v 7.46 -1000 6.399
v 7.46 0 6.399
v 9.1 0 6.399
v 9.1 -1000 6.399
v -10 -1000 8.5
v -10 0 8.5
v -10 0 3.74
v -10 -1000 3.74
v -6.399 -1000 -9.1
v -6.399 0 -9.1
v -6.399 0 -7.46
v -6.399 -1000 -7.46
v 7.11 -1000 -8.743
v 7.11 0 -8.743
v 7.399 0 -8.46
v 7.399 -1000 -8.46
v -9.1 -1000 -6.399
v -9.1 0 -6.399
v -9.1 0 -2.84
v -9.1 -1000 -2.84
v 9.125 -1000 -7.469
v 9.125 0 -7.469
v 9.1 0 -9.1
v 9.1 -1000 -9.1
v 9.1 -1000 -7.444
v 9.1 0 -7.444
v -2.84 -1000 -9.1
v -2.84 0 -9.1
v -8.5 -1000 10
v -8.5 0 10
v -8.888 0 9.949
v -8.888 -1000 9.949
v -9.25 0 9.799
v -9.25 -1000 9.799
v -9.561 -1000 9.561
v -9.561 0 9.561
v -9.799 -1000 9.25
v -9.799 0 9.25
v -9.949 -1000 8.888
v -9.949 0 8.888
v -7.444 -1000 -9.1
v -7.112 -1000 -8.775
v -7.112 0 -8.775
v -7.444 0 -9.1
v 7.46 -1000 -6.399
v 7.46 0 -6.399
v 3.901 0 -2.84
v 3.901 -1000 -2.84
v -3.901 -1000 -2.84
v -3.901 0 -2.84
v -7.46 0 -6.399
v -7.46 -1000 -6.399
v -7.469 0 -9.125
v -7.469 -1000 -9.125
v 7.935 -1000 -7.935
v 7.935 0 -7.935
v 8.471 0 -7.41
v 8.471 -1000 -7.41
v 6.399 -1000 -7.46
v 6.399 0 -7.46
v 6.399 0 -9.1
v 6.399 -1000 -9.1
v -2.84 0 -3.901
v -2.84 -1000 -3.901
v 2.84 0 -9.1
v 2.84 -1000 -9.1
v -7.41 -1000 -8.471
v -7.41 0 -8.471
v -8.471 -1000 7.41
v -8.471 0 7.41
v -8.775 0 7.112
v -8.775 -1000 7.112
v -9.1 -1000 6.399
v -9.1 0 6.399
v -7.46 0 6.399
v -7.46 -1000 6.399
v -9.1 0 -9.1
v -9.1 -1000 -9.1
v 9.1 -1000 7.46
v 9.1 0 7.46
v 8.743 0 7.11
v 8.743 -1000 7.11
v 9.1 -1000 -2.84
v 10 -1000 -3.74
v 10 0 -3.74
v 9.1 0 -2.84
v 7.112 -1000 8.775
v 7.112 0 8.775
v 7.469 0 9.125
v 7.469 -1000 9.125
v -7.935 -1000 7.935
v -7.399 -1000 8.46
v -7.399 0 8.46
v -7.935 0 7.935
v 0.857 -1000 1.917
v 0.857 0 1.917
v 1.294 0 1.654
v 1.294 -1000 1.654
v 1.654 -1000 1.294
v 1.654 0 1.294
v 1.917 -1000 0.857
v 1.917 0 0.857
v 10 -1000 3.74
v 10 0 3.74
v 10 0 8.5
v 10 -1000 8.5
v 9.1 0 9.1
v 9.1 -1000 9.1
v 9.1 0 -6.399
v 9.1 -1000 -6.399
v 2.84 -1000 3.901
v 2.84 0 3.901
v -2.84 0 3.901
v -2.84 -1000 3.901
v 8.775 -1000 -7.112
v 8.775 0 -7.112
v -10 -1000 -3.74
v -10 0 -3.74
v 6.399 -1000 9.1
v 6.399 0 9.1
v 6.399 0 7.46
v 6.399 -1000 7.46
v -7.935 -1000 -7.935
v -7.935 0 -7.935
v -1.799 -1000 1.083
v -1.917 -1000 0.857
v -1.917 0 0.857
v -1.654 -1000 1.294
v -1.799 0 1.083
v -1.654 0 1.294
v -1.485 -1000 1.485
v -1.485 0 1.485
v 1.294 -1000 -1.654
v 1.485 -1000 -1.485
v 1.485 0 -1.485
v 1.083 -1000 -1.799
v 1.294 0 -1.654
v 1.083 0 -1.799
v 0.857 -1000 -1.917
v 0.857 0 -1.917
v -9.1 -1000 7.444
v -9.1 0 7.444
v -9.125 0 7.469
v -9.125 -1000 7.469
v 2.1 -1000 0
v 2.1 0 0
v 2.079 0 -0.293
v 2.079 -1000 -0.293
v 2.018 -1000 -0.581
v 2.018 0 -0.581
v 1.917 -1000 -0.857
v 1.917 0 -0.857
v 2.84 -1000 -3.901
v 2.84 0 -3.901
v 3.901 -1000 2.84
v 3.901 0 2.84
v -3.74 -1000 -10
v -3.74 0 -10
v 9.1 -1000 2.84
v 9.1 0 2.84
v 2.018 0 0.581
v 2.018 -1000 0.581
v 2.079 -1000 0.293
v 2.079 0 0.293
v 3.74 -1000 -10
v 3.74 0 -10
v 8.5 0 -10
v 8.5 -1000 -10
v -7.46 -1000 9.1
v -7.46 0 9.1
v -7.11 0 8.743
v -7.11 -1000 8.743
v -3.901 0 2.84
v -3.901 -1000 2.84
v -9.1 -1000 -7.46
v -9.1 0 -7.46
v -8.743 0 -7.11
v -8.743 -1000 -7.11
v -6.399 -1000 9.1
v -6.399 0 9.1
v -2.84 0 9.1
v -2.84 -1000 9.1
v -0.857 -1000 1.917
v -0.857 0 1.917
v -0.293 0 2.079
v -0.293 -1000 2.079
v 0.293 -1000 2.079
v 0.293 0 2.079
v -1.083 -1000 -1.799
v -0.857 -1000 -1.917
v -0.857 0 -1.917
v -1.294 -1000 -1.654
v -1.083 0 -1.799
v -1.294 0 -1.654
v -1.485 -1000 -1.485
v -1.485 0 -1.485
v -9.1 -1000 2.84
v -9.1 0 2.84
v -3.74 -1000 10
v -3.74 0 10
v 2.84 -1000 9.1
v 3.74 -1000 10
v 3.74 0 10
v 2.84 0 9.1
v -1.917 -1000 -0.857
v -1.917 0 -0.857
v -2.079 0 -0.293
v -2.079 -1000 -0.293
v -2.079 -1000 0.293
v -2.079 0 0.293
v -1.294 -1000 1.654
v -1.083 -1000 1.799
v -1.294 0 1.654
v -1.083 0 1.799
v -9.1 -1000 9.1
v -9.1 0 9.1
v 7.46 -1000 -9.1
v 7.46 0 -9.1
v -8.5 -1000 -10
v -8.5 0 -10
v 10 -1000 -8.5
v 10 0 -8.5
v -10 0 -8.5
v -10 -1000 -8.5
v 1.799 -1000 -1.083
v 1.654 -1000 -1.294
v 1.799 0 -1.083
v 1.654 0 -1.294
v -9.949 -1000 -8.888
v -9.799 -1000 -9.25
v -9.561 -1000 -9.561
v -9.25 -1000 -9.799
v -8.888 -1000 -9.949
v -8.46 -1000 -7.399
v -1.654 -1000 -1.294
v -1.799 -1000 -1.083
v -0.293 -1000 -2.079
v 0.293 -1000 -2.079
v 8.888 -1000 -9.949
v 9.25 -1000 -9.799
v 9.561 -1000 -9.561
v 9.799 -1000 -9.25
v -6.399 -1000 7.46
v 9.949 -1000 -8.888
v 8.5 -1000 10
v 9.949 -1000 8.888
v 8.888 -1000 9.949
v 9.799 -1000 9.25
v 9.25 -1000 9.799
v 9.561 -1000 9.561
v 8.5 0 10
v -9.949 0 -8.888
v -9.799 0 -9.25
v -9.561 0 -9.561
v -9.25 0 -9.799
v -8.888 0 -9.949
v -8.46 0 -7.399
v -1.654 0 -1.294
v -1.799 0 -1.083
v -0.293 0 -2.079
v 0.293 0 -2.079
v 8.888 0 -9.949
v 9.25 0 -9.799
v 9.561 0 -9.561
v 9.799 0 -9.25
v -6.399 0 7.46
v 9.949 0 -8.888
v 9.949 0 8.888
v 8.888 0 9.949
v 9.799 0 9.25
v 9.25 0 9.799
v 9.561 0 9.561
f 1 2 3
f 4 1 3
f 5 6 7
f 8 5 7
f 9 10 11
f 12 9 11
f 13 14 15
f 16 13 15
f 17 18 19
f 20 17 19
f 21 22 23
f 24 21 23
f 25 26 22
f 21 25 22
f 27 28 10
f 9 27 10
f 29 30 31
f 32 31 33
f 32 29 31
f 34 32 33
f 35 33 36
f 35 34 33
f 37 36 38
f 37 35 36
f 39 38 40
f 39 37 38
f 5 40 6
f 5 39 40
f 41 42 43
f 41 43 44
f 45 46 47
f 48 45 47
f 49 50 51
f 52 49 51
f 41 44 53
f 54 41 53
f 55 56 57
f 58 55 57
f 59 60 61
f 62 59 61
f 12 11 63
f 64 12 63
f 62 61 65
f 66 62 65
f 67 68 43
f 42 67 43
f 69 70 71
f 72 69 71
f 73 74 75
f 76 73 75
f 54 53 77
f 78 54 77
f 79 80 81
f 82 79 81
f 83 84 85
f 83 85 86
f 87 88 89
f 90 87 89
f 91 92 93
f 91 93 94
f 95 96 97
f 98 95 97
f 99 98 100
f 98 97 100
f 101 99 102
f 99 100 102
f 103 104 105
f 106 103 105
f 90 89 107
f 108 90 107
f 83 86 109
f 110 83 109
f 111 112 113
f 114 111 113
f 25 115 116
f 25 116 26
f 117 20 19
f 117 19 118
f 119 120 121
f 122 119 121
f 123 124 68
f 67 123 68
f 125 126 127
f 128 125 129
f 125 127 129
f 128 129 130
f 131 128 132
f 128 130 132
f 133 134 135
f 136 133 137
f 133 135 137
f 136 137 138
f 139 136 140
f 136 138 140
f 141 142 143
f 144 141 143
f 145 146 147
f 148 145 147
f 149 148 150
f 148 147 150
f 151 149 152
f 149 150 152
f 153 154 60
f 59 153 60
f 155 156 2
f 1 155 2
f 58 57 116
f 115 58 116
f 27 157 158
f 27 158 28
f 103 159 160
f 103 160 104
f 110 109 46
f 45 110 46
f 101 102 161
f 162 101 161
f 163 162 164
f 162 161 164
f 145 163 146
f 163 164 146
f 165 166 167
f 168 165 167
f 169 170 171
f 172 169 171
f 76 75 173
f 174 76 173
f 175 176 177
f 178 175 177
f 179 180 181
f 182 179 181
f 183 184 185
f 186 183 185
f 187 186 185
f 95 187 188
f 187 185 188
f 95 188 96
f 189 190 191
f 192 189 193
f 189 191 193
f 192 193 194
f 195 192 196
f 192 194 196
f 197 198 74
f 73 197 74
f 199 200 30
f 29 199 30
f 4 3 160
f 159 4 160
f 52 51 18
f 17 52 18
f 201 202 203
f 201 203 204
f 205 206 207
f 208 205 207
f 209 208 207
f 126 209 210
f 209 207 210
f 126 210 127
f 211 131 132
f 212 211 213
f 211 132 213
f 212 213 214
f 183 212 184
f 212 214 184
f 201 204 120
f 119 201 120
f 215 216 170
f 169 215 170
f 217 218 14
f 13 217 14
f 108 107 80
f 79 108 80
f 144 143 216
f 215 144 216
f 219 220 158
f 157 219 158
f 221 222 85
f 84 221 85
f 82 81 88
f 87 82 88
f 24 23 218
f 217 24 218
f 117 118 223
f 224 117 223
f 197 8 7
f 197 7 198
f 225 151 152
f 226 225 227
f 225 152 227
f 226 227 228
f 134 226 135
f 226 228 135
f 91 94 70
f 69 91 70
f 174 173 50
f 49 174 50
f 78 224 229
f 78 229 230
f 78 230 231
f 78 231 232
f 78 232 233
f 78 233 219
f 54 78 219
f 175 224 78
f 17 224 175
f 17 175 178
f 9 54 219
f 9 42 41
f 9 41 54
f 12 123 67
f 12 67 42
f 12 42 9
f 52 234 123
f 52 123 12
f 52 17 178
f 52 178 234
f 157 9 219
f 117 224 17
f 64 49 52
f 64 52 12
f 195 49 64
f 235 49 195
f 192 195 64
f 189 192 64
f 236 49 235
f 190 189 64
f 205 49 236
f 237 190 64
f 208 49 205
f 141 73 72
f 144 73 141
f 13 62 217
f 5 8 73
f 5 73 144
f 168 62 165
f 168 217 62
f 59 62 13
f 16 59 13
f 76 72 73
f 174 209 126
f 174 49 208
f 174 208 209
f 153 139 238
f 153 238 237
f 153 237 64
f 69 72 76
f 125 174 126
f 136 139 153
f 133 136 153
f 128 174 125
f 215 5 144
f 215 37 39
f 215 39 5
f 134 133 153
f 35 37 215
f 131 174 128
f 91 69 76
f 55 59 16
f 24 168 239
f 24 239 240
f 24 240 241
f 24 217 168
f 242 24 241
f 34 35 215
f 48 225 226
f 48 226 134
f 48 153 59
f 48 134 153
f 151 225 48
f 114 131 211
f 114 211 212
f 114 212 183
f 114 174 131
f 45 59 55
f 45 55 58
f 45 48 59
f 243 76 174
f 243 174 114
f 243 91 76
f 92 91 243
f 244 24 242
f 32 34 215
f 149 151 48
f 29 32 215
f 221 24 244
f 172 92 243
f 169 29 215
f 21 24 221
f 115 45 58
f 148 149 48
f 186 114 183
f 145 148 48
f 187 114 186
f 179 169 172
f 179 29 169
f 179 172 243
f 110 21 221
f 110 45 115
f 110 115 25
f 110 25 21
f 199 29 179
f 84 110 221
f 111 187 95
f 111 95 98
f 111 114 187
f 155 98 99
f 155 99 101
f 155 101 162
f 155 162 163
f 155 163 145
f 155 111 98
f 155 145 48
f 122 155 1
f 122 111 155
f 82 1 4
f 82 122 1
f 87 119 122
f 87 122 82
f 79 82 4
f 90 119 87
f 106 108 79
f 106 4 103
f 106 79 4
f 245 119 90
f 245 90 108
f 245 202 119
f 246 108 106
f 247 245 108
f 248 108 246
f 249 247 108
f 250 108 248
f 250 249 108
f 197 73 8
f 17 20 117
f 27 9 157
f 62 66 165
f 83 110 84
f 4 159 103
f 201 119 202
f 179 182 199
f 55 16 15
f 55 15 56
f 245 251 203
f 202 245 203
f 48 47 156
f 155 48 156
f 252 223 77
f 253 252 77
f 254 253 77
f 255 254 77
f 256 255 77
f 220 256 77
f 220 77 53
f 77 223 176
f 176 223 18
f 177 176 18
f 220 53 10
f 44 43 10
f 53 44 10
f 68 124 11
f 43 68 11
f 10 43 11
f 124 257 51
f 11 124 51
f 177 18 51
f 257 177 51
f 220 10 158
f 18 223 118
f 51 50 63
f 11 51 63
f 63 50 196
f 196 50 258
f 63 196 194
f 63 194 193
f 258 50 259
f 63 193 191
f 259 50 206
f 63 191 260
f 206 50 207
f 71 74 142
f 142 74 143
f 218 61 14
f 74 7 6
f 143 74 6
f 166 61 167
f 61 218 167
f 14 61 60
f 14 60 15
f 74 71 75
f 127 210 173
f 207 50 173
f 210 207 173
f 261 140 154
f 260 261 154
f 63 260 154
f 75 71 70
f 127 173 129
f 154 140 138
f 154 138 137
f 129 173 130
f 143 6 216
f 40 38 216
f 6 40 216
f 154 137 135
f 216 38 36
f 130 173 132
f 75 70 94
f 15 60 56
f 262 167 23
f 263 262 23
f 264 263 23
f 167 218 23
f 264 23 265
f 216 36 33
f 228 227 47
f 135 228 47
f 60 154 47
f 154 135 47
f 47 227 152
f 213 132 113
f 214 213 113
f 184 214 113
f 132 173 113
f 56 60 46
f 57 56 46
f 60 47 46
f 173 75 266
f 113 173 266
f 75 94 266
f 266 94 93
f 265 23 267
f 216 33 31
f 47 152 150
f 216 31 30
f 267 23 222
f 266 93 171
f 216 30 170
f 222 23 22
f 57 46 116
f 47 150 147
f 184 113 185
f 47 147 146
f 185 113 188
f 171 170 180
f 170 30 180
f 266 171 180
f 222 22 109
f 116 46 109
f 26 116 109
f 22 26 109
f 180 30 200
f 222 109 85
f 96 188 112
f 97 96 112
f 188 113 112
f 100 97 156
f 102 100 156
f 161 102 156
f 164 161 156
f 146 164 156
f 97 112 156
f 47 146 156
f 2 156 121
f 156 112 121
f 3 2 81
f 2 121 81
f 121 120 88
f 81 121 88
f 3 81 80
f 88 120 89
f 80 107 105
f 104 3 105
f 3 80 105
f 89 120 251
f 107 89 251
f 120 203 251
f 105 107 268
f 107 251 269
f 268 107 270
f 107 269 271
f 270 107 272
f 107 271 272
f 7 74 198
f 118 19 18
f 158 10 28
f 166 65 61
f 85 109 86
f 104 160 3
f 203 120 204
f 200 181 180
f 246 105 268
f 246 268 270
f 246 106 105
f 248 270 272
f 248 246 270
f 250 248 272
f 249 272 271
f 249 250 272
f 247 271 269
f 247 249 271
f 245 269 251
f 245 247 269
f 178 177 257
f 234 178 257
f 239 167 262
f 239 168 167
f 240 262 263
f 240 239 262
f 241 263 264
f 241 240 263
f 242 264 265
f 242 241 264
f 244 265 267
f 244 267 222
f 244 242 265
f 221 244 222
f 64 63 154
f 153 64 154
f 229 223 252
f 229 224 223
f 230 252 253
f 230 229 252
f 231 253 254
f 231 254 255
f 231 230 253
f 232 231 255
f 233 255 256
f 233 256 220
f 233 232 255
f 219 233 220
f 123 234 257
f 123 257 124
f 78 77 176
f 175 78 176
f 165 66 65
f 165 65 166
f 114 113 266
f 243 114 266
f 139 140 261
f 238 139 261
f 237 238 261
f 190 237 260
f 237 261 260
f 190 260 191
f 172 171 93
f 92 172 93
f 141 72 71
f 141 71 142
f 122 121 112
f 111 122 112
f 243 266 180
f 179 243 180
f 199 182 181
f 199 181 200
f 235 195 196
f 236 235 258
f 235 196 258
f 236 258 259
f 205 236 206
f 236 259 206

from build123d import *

# Parameters (mm, degrees)
F1_DEPTH = 1000
F2_R     = 1.5


with BuildPart() as f1:
    # F0 (on Front) → F1 (new body)
    with BuildSketch(Plane.XZ):
        Polygon((-7.46, 9.1), (-6.39934, 9.1), (-2.84, 9.1), (-3.74, 10), (-10, 10), (-10, 3.74), (-9.1, 2.84), (-9.1, 6.39934), (-9.1, 7.444134), (-9.124691, 7.46934), (-9.1, 9.1), align=None)
        Polygon((-7.399089, 8.459749), (-6.39934, 7.46), (-6.39934, 9.1), (-7.46, 9.1), (-7.110116, 8.742815), align=None)
        Polygon((-7.46, 6.39934), (-8.470702, 7.410042), (-8.774807, 7.112154), (-9.1, 7.444134), (-9.1, 6.39934), align=None)
        with BuildLine():
            ThreePointArc((-1.917323, 0.856663), (-1.729884, 1.190588), (-1.484924, 1.484924))
            Line((-1.484924, 1.484924), (-7.934896, 7.934896))
            Line((-7.934896, 7.934896), (-8.470702, 7.410042))
            Line((-8.470702, 7.410042), (-7.46, 6.39934))
            Line((-7.46, 6.39934), (-3.90066, 2.84))
            Line((-3.90066, 2.84), (-1.917323, 0.856663))
        make_face()
        with BuildLine():
            ThreePointArc((-1.484924, 1.484924), (-1.190588, 1.729884), (-0.856663, 1.917323))
            Line((-0.856663, 1.917323), (-2.84, 3.90066))
            Line((-2.84, 3.90066), (-6.39934, 7.46))
            Line((-6.39934, 7.46), (-7.399089, 8.459749))
            Line((-7.399089, 8.459749), (-7.934896, 7.934896))
            Line((-7.934896, 7.934896), (-1.484924, 1.484924))
        make_face()
        with BuildLine():
            ThreePointArc((0.856663, 1.917323), (1.484924, 1.484924), (1.917323, 0.856663))
            Line((1.917323, 0.856663), (3.90066, 2.84))
            Line((3.90066, 2.84), (7.46, 6.39934))
            Line((7.46, 6.39934), (9.1, 6.39934))
            Line((9.1, 6.39934), (9.1, 2.84))
            Line((9.1, 2.84), (10, 3.74))
            Line((10, 3.74), (10, 10))
            Line((10, 10), (3.74, 10))
            Line((3.74, 10), (2.84, 9.1))
            Line((2.84, 9.1), (6.39934, 9.1))
            Line((6.39934, 9.1), (6.39934, 7.46))
            Line((6.39934, 7.46), (2.84, 3.90066))
            Line((2.84, 3.90066), (0.856663, 1.917323))
        make_face()
        Polygon((7.112154, 8.774807), (7.46934, 9.124691), (9.1, 9.1), (9.1, 7.46), (8.742815, 7.110116), align=None, mode=Mode.SUBTRACT)
        with BuildLine():
            ThreePointArc((1.917323, 0.856663), (2.053823, 0.437962), (2.1, 0))
            ThreePointArc((2.1, 0), (2.053823, -0.437962), (1.917323, -0.856663))
            Line((1.917323, -0.856663), (3.90066, -2.84))
            Line((3.90066, -2.84), (3.90066, 2.84))
            Line((3.90066, 2.84), (1.917323, 0.856663))
        make_face()
        with BuildLine():
            ThreePointArc((-0.856663, 1.917323), (0, 2.1), (0.856663, 1.917323))
            Line((0.856663, 1.917323), (2.84, 3.90066))
            Line((2.84, 3.90066), (-2.84, 3.90066))
            Line((-2.84, 3.90066), (-0.856663, 1.917323))
        make_face()
        with BuildLine():
            ThreePointArc((-1.917323, -0.856663), (-2.1, 0), (-1.917323, 0.856663))
            Line((-1.917323, 0.856663), (-3.90066, 2.84))
            Line((-3.90066, 2.84), (-3.90066, -2.84))
            Line((-3.90066, -2.84), (-1.917323, -0.856663))
        make_face()
        with BuildLine():
            Line((2.84, -3.90066), (0.856663, -1.917323))
            ThreePointArc((0.856663, -1.917323), (0, -2.1), (-0.856663, -1.917323))
            Line((-0.856663, -1.917323), (-2.84, -3.90066))
            Line((-2.84, -3.90066), (2.84, -3.90066))
        make_face()
        with BuildLine():
            Line((-2.84, -3.90066), (-0.856663, -1.917323))
            ThreePointArc((-0.856663, -1.917323), (-1.190588, -1.729884), (-1.484924, -1.484924))
            Line((-1.484924, -1.484924), (-7.934896, -7.934896))
            Line((-7.934896, -7.934896), (-7.410042, -8.470702))
            Line((-7.410042, -8.470702), (-6.39934, -7.46))
            Line((-6.39934, -7.46), (-2.84, -3.90066))
        make_face()
        with BuildLine():
            Line((-7.934896, -7.934896), (-1.484924, -1.484924))
            ThreePointArc((-1.484924, -1.484924), (-1.729884, -1.190588), (-1.917323, -0.856663))
            Line((-1.917323, -0.856663), (-3.90066, -2.84))
            Line((-3.90066, -2.84), (-7.46, -6.39934))
            Line((-7.46, -6.39934), (-8.459749, -7.399089))
            Line((-8.459749, -7.399089), (-7.934896, -7.934896))
        make_face()
        with BuildLine():
            Line((7.934896, -7.934896), (1.484924, -1.484924))
            ThreePointArc((1.484924, -1.484924), (1.190588, -1.729884), (0.856663, -1.917323))
            Line((0.856663, -1.917323), (2.84, -3.90066))
            Line((2.84, -3.90066), (6.39934, -7.46))
            Line((6.39934, -7.46), (7.399089, -8.459749))
            Line((7.399089, -8.459749), (7.934896, -7.934896))
        make_face()
        with BuildLine():
            Line((3.90066, -2.84), (1.917323, -0.856663))
            ThreePointArc((1.917323, -0.856663), (1.729884, -1.190588), (1.484924, -1.484924))
            Line((1.484924, -1.484924), (7.934896, -7.934896))
            Line((7.934896, -7.934896), (8.470702, -7.410042))
            Line((8.470702, -7.410042), (7.46, -6.39934))
            Line((7.46, -6.39934), (3.90066, -2.84))
        make_face()
        Polygon((9.1, -2.84), (9.1, -6.39934), (9.1, -7.444134), (9.124691, -7.46934), (9.1, -9.1), (7.46, -9.1), (6.39934, -9.1), (2.84, -9.1), (3.74, -10), (10, -10), (10, -3.74), align=None)
        Polygon((9.1, -6.39934), (7.46, -6.39934), (8.470702, -7.410042), (8.774807, -7.112154), (9.1, -7.444134), align=None)
        Polygon((7.110116, -8.742815), (7.399089, -8.459749), (6.39934, -7.46), (6.39934, -9.1), (7.46, -9.1), align=None)
        Polygon((-2.84, -9.1), (-6.39934, -9.1), (-7.444134, -9.1), (-7.46934, -9.124691), (-9.1, -9.1), (-9.1, -7.46), (-9.1, -6.39934), (-9.1, -2.84), (-10, -3.74), (-10, -10), (-3.74, -10), align=None)
        Polygon((-6.39934, -9.1), (-6.39934, -7.46), (-7.410042, -8.470702), (-7.112154, -8.774807), (-7.444134, -9.1), align=None)
        Polygon((-8.742815, -7.110116), (-8.459749, -7.399089), (-7.46, -6.39934), (-9.1, -6.39934), (-9.1, -7.46), align=None)
    extrude(amount=F1_DEPTH)

    # F2
    f2_edges = [f1.edges().sort_by_distance(p)[0] for p in [
        (10, -500, 10),
        (-10, -500, 10),
        (-10, -500, -10),
        (10, -500, -10),
    ]]
    fillet(f2_edges, radius=F2_R)


solid = f1.part
